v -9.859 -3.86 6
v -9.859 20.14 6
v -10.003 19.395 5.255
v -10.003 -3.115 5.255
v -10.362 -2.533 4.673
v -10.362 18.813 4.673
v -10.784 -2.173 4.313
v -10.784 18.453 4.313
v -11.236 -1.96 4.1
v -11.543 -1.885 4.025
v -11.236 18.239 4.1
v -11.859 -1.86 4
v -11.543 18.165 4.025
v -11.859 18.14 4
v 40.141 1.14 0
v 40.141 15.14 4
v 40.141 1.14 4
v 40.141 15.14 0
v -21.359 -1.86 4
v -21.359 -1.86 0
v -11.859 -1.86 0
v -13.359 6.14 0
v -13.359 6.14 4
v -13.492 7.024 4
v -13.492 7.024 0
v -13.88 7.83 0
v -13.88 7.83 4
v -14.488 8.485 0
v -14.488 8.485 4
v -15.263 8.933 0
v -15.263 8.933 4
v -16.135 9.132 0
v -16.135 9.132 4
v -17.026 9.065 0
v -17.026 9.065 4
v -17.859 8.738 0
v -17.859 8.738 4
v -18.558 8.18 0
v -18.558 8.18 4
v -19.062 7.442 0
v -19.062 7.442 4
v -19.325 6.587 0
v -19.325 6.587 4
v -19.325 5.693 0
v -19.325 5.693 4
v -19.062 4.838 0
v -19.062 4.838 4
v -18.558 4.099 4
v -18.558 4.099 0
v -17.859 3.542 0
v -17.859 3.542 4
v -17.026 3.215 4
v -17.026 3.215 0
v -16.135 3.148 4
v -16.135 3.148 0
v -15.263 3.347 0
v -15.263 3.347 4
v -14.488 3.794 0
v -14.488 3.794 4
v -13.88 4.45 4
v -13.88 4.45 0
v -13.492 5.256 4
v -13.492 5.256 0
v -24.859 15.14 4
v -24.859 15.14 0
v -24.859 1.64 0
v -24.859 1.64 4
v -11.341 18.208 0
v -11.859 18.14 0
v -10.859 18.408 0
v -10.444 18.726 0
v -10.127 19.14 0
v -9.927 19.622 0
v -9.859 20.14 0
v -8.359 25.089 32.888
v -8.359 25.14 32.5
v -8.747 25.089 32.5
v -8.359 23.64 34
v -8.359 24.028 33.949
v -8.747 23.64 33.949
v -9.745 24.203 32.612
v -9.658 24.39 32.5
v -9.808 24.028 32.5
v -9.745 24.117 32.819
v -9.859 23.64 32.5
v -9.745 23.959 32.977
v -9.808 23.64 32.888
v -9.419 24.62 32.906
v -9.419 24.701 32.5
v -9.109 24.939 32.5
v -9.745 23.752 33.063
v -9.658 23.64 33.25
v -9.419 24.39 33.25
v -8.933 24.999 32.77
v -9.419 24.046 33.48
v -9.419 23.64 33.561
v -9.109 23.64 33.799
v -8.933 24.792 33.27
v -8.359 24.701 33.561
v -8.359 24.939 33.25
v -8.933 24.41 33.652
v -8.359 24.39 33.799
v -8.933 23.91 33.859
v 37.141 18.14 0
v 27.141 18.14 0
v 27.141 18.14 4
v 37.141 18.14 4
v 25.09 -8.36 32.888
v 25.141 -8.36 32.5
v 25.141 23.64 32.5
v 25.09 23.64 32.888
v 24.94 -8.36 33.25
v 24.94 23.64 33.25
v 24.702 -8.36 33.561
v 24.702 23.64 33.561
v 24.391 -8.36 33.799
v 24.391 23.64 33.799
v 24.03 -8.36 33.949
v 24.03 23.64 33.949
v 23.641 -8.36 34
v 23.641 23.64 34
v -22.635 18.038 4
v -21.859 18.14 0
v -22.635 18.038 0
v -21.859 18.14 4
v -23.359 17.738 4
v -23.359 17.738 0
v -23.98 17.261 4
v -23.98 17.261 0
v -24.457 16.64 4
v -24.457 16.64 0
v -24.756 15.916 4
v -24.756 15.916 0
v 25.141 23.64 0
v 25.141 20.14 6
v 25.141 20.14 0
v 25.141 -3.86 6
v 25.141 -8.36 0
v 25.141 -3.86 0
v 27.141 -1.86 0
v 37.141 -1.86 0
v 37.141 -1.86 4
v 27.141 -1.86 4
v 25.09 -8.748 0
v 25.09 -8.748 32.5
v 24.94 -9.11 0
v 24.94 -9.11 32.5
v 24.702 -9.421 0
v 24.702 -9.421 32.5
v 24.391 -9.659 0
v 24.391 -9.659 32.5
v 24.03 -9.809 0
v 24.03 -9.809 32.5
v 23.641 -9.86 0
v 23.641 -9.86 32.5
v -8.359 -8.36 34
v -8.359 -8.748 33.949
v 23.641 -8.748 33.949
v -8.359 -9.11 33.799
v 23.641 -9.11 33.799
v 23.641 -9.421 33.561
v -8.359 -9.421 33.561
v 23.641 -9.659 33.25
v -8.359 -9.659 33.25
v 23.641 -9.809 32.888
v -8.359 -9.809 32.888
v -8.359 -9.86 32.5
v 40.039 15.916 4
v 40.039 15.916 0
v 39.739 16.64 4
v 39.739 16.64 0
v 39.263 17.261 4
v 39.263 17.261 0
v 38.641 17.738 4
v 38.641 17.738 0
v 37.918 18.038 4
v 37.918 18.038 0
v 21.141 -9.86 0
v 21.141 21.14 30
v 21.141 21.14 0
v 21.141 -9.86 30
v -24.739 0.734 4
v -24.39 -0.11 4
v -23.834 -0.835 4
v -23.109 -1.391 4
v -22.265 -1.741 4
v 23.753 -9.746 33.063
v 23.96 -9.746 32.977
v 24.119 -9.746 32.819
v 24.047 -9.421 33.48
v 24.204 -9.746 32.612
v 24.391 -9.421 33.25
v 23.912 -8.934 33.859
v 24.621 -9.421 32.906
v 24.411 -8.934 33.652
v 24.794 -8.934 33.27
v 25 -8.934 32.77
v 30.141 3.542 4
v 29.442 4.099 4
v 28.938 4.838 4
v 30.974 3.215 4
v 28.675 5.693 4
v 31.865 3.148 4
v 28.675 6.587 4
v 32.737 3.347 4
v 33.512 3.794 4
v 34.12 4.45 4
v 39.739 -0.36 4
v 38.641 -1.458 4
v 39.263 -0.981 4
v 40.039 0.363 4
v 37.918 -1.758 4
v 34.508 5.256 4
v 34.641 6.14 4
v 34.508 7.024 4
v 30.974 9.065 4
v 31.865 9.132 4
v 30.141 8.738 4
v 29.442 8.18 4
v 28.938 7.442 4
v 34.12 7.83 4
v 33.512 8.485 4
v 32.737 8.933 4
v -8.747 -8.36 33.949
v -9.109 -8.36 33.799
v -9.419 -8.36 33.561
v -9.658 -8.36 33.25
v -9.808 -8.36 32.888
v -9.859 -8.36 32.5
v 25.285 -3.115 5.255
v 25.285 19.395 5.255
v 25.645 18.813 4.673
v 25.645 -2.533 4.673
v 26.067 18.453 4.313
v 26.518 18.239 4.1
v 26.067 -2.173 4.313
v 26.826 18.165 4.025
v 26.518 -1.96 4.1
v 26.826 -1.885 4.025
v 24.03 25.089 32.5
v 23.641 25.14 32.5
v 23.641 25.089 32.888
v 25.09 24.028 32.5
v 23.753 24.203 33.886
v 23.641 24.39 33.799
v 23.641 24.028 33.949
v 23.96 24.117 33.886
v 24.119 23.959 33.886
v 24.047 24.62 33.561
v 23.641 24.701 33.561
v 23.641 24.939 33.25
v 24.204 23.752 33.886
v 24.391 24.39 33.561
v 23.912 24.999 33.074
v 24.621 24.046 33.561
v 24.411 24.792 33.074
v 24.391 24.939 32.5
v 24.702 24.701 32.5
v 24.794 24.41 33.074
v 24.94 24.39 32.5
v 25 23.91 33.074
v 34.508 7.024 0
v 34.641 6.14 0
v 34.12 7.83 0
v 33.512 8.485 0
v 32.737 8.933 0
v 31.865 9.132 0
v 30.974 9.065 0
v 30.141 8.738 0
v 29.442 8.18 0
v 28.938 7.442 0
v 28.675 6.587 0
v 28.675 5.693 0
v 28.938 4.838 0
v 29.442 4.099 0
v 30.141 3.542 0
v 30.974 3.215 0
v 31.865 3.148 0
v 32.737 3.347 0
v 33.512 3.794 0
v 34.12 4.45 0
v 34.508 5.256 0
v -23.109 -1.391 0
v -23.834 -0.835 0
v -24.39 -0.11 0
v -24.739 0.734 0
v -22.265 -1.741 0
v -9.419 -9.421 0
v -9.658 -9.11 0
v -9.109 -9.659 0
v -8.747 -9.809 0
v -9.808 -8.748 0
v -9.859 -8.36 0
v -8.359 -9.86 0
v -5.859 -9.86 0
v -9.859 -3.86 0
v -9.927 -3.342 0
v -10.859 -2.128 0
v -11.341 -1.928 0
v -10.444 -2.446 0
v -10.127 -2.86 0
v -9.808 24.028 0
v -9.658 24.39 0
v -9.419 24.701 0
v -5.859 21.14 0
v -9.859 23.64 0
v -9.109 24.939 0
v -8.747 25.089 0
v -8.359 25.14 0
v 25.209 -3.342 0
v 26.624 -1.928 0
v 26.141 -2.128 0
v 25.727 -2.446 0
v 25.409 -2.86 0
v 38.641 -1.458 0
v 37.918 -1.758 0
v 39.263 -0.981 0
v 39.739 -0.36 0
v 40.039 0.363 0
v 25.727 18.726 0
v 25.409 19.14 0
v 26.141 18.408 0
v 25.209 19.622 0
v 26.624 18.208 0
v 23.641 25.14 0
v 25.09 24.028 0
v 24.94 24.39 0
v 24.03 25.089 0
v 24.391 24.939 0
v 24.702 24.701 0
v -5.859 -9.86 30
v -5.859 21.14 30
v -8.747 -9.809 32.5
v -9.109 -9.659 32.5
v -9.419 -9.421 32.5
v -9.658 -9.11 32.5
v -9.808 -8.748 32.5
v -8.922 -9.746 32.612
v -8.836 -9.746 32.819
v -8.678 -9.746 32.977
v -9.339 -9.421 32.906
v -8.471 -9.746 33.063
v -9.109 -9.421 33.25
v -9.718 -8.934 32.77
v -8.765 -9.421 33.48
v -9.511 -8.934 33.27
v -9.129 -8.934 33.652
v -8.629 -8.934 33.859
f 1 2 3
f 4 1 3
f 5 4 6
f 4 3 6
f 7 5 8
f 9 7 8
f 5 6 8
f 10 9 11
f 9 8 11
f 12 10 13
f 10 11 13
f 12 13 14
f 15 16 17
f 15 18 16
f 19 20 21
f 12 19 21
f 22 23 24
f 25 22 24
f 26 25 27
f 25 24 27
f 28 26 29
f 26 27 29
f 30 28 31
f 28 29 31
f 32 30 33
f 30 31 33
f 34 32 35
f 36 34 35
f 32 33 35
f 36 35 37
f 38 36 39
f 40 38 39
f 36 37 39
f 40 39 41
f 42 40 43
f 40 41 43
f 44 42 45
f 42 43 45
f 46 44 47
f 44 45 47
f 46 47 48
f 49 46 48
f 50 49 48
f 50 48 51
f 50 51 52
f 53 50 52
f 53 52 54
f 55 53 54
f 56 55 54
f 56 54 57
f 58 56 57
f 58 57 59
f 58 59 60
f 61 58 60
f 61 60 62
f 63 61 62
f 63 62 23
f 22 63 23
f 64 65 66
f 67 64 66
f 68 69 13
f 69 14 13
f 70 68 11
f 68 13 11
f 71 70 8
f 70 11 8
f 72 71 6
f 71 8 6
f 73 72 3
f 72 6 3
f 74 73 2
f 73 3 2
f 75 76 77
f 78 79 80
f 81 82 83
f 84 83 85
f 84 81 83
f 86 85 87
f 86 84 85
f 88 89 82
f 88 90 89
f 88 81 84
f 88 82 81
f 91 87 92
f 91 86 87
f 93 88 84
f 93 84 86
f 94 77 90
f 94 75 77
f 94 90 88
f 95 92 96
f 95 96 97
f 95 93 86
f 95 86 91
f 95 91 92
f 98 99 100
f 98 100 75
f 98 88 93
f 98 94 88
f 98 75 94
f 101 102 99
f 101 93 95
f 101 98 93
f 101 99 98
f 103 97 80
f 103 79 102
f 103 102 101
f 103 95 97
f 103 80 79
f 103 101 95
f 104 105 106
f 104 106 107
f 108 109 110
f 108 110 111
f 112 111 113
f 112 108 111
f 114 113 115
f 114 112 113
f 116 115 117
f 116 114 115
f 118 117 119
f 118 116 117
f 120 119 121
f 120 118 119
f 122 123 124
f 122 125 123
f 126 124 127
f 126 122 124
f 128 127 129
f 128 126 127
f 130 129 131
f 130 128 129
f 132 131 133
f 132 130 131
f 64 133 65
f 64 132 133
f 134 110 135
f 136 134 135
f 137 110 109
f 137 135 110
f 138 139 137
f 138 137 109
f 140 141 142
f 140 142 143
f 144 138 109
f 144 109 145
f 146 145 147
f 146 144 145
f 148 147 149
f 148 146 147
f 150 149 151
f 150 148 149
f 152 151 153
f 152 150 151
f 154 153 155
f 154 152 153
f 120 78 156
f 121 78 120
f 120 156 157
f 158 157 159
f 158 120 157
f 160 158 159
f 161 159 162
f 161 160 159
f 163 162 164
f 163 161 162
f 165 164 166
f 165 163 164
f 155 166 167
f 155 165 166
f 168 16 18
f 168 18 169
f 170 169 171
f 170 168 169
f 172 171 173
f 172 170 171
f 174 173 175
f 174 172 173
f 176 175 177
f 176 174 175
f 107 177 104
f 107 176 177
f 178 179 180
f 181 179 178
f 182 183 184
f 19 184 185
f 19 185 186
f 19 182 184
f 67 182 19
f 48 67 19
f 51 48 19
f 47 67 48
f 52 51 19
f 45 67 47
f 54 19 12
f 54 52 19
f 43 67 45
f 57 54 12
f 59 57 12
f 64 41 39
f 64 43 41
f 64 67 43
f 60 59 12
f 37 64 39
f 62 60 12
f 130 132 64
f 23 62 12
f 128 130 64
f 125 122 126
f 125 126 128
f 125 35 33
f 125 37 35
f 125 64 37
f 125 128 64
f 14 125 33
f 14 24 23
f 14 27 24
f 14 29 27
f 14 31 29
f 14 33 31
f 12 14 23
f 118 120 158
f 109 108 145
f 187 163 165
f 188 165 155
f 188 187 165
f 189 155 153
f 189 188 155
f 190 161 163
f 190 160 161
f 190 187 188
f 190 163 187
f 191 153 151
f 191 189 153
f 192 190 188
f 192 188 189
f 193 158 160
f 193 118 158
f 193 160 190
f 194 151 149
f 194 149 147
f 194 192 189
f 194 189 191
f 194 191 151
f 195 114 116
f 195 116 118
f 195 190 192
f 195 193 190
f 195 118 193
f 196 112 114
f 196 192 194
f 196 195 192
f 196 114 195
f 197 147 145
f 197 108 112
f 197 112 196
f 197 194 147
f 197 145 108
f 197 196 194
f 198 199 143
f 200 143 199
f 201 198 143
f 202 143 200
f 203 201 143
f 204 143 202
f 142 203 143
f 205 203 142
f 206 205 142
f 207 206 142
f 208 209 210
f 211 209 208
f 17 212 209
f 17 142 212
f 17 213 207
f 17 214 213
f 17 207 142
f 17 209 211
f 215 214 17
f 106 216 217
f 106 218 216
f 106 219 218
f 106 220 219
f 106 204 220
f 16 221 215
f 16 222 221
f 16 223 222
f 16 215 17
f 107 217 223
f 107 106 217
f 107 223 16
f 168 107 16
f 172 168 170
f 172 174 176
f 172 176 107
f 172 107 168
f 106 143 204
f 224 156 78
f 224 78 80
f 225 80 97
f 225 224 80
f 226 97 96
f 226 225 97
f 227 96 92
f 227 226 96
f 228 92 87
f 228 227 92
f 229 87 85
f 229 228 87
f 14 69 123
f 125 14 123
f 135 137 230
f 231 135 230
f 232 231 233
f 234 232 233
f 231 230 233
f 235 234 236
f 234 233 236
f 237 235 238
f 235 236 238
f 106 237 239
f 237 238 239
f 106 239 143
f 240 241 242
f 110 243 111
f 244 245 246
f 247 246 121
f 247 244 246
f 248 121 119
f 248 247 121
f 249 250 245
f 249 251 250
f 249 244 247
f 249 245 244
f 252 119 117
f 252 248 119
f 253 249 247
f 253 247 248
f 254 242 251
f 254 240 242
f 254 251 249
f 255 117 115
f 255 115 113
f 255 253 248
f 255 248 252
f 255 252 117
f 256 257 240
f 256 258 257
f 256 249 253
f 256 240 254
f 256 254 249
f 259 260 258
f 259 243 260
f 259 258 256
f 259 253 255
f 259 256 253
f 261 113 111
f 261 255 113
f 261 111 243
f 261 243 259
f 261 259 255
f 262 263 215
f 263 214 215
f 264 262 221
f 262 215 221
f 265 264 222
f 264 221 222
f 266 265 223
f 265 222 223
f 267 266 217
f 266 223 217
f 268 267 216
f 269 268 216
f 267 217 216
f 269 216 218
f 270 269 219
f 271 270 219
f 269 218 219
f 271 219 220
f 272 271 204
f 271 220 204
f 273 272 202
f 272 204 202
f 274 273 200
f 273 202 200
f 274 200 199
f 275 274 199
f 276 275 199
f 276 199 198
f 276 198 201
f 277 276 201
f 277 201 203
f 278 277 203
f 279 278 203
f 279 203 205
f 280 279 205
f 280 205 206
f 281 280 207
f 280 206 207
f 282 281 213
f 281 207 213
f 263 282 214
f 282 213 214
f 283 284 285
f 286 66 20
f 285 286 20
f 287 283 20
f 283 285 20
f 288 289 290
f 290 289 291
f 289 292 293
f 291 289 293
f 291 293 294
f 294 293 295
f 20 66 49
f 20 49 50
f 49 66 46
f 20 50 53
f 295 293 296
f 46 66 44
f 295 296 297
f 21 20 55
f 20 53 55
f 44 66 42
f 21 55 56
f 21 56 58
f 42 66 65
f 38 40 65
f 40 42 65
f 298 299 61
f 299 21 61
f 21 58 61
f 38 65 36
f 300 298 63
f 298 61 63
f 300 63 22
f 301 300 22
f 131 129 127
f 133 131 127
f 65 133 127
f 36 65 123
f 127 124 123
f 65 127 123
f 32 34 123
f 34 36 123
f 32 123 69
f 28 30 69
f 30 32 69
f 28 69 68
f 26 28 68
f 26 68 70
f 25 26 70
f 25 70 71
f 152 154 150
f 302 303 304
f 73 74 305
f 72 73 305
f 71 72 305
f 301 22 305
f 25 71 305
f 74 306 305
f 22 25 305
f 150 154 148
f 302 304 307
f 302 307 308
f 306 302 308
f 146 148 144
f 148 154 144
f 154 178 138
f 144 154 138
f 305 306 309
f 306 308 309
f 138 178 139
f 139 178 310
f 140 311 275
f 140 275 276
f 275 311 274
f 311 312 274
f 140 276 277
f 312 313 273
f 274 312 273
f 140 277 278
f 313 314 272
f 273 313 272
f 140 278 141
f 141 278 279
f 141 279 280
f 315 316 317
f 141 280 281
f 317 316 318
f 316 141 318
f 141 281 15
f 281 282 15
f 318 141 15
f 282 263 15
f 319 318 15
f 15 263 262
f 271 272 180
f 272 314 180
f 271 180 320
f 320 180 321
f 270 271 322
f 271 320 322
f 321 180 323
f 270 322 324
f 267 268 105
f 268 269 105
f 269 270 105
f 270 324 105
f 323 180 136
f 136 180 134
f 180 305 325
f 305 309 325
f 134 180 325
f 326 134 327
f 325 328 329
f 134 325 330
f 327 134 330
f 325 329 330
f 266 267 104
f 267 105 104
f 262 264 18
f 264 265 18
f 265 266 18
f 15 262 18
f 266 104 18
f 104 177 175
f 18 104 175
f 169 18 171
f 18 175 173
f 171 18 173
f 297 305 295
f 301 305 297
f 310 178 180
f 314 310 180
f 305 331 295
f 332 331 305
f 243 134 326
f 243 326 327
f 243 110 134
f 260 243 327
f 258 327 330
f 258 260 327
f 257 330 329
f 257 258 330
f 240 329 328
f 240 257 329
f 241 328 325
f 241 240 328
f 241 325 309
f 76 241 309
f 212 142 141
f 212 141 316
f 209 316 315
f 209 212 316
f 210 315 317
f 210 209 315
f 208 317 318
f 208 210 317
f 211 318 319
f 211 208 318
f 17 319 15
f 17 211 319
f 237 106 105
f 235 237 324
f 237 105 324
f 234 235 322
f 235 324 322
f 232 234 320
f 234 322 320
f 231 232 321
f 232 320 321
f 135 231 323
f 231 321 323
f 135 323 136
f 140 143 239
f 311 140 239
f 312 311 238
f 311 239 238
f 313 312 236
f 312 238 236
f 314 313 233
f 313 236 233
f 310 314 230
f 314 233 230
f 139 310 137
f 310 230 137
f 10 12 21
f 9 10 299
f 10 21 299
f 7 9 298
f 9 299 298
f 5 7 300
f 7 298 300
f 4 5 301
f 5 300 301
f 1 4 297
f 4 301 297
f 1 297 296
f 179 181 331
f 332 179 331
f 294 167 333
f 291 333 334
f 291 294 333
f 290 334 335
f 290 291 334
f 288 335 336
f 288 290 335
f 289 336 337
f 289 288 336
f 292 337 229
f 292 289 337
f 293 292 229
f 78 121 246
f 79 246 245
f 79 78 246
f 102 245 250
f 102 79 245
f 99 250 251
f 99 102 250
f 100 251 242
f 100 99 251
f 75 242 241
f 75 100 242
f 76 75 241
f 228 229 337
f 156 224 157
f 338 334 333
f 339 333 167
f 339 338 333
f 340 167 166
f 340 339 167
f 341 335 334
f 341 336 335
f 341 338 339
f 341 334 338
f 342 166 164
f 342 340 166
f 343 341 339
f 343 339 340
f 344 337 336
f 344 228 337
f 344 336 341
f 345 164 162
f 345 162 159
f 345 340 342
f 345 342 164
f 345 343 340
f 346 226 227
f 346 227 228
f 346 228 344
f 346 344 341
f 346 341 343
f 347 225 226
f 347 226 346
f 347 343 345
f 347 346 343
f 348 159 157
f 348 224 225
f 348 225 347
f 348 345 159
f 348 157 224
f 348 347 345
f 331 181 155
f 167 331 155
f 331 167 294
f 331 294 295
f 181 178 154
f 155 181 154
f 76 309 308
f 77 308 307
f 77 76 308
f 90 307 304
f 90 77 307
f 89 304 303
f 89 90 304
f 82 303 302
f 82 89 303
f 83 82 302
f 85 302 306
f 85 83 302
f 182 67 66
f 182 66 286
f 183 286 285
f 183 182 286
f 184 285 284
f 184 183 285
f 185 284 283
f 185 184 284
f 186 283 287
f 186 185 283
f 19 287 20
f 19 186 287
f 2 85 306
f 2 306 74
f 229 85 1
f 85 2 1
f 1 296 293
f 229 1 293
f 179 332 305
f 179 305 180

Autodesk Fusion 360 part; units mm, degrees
sketch "Sketch5" plane through (0, 0, 0) normal (0, 0, 1) x (1, 0, 0)
  line L0 (25.1413, 25.1399) -> (-9.8587, 25.1399)
  line L1 (-9.8587, 25.1399) -> (-9.8587, -9.8601)
  line L2 (-9.8587, -9.8601) -> (25.1413, -9.8601)
  line L3 (25.1413, -9.8601) -> (25.1413, 25.1399)
  line L4 (-9.8587, 18.1399) -> (-24.8587, 18.1399)
  line L5 (-24.8587, 18.1399) -> (-24.8587, -1.8601)
  line L6 (-24.8587, -1.8601) -> (-9.8587, -1.8601)
  line L7 (-9.8587, -1.8601) -> (-9.8587, 18.1399)
  line L8 (25.1413, 18.1399) -> (40.1413, 18.1399)
  line L9 (40.1413, 18.1399) -> (40.1413, -1.8601)
  line L10 (40.1413, -1.8601) -> (25.1413, -1.8601)
  line L11 (25.1413, -1.8601) -> (25.1413, 18.1399)
  dimension "d12" = 35
  dimension "d13" = 35
  dimension "d14" = 15
  dimension "d15" = 20
  dimension "d16" = 7
  dimension "d17" = 15
  dimension "d18" = 20
  dimension "d19" = 7
extrude "Extrude4" add sketch "Sketch5" along normal blind 4
sketch "Sketch6" plane through (0, 0, 4) normal (0, 0, 1) x (1, 0, 0)
  line L0 (25.1413, 18.1399) -> (25.1413, 25.1399)
  line L1 (25.1413, 25.1399) -> (-9.8587, 25.1399)
  line L2 (-9.8587, 25.1399) -> (-9.8587, 18.1399)
  line L3 (-9.8587, 18.1399) -> (-24.8587, 18.1399)
  line L4 (-24.8587, 18.1399) -> (-24.8587, -1.8601)
  line L5 (-24.8587, -1.8601) -> (-9.8587, -1.8601)
  line L6 (-9.8587, -1.8601) -> (-9.8587, -9.8601)
  line L7 (-9.8587, -9.8601) -> (25.1413, -9.8601)
  line L8 (25.1413, -9.8601) -> (25.1413, -1.8601)
  line L9 (25.1413, -1.8601) -> (40.1413, -1.8601)
  line L10 (40.1413, -1.8601) -> (40.1413, 18.1399)
  line L11 (40.1413, 18.1399) -> (25.1413, 18.1399)
  circle A0 centre (-16.3587, 6.1399) radius 3
  circle A1 centre (31.6413, 6.1399) radius 3
  line L12 (7.6413, 25.1399) -> (7.6413, -9.8601) construction
  dimension "d22" = 6
  dimension "d23" = 6
  dimension "d24" = 48
  dimension "d25" = 12
  dimension "d26" = 12
  dimension "d27" = 24
extrude "Extrude5" cut sketch "Sketch6" against normal up to surface (4 mm away) contours A0 | A1
sketch "Sketch7" plane through (0, 0, 4) normal (0, 0, 1) x (1, 0, 0)
  circle A0 centre (-16.3587, 6.1399) radius 3
  circle A1 centre (31.6413, 6.1399) radius 3
  line L0 (25.1413, 18.1399) -> (25.1413, 25.1399)
  line L1 (25.1413, 25.1399) -> (-9.8587, 25.1399)
  line L2 (-9.8587, 25.1399) -> (-9.8587, 18.1399)
  line L3 (-9.8587, 18.1399) -> (-24.8587, 18.1399)
  line L4 (-24.8587, 18.1399) -> (-24.8587, -1.8601)
  line L5 (-24.8587, -1.8601) -> (-9.8587, -1.8601)
  line L6 (-9.8587, -1.8601) -> (-9.8587, -9.8601)
  line L7 (-9.8587, -9.8601) -> (25.1413, -9.8601)
  line L8 (25.1413, -9.8601) -> (25.1413, -1.8601)
  line L9 (25.1413, -1.8601) -> (40.1413, -1.8601)
  line L10 (40.1413, -1.8601) -> (40.1413, 18.1399)
  line L11 (40.1413, 18.1399) -> (25.1413, 18.1399)
  line L12 (-5.8587, 21.1399) -> (21.1413, 21.1399)
  line L13 (21.1413, 21.1399) -> (21.1413, -9.8601)
  line L14 (21.1413, -9.8601) -> (-5.8587, -9.8601)
  line L15 (-5.8587, -9.8601) -> (-5.8587, 21.1399)
  dimension "d30" = 4
  dimension "d31" = 4
  dimension "d32" = 4
sketch "Sketch9" plane through (0, 0, 4) normal (0, 0, 1) x (1, 0, 0)
  circle A0 centre (-16.3587, 6.1399) radius 3
  circle A1 centre (31.6413, 6.1399) radius 3
  line L0 (25.1413, 18.1399) -> (25.1413, 25.1399)
  line L1 (25.1413, 25.1399) -> (-9.8587, 25.1399)
  line L2 (-9.8587, 25.1399) -> (-9.8587, 18.1399)
  line L3 (-9.8587, 18.1399) -> (-24.8587, 18.1399)
  line L4 (-24.8587, 18.1399) -> (-24.8587, -1.8601)
  line L5 (-24.8587, -1.8601) -> (-9.8587, -1.8601)
  line L6 (-9.8587, -1.8601) -> (-9.8587, -9.8601)
  line L7 (-9.8587, -9.8601) -> (25.1413, -9.8601)
  line L8 (25.1413, -9.8601) -> (25.1413, -1.8601)
  line L9 (25.1413, -1.8601) -> (40.1413, -1.8601)
  line L10 (40.1413, -1.8601) -> (40.1413, 18.1399)
  line L11 (40.1413, 18.1399) -> (25.1413, 18.1399)
  line L12 (-9.8587, 25.1399) -> (25.1413, 25.1399)
  line L13 (25.1413, 25.1399) -> (25.1413, -9.8601)
  line L14 (25.1413, -9.8601) -> (-9.8587, -9.8601)
  line L15 (-9.8587, -9.8601) -> (-9.8587, 25.1399)
extrude "Extrude7" add sketch "Sketch9" along normal blind 30 contours L0 L1 L2 L6 L7 L8 L12 L13 L14 L15
extrude "Extrude6" cut sketch "Sketch7" against normal blind 4 contours L7 L12 L13 L14 L15
sketch "Sketch8" plane through (0, 0, 4) normal (0, 0, 1) x (1, 0, 0)
  line L0 (25.1413, 18.1399) -> (25.1413, -1.8601)
  line L1 (25.1413, -1.8601) -> (40.1413, -1.8601)
  line L2 (40.1413, -1.8601) -> (40.1413, 18.1399)
  line L3 (40.1413, 18.1399) -> (25.1413, 18.1399)
  line L4 (-9.8587, 18.1399) -> (-24.8587, 18.1399)
  line L5 (-24.8587, 18.1399) -> (-24.8587, -1.8601)
  line L6 (-24.8587, -1.8601) -> (-9.8587, -1.8601)
  line L7 (-9.8587, -1.8601) -> (-9.8587, 18.1399)
  circle A0 centre (-16.3587, 6.1399) radius 3
  circle A1 centre (31.6413, 6.1399) radius 3
  line L8 (-9.8587, 53.1399) -> (25.1413, 53.1399)
  line L9 (25.1413, 53.1399) -> (25.1413, 18.1399)
  line L10 (25.1413, 18.1399) -> (-9.8587, 18.1399)
  line L11 (-9.8587, 18.1399) -> (-9.8587, 53.1399)
sketch "Sketch10" plane through (0, 0, 4) normal (0, 0, -1) x (-1, 0, 0)
  line L0 (-21.1413, -9.8601) -> (5.8587, -9.8601)
  line L1 (5.8587, -9.8601) -> (5.8587, 21.1399)
  line L2 (5.8587, 21.1399) -> (-21.1413, 21.1399)
  line L3 (-21.1413, 21.1399) -> (-21.1413, -9.8601)
  line L4 (-21.1413, 21.1399) -> (5.8587, 21.1399)
  line L5 (5.8587, 21.1399) -> (5.8587, -9.8601)
  line L6 (5.8587, -9.8601) -> (-21.1413, -9.8601)
  line L7 (-21.1413, -9.8601) -> (-21.1413, 21.1399)
extrude "Extrude8" cut sketch "Sketch10" against normal up to surface (26 mm away)
fillet "Fillet1" radius 1.5 8 edges at (25.1413, 25.1399, 17) (7.6413, 25.1399, 34) (25.1413, 7.6399, 34) (-9.8587, 7.6399, 34) (-9.8587, 25.1399, 17) (25.1413, -9.8601, 17) (7.6413, -9.8601, 34) (-9.8587, -9.8601, 17)
fillet "Fillet2" radius 2 1 edges at (-9.8587, 8.1399, 4)
fillet "Fillet3" radius 2 1 edges at (-9.8587, 18.1399, 3)
fillet "Fillet4" radius 2 1 edges at (25.1413, 8.1399, 4)
fillet "Fillet5" radius 2 1 edges at (25.1413, 18.1399, 3)
fillet "Fillet6" radius 2 1 edges at (25.1413, -1.8601, 3)
fillet "Fillet7" radius 2 1 edges at (-9.8587, -1.8601, 3)
fillet "Fillet8" radius 3 1 edges at (40.1413, 18.1399, 2)
fillet "Fillet9" radius 3 1 edges at (40.1413, -1.8601, 2)
fillet "Fillet10" radius 3 1 edges at (-24.8587, 18.1399, 2)
fillet "Fillet11" radius 3.5 1 edges at (-24.8587, -1.8601, 2)
